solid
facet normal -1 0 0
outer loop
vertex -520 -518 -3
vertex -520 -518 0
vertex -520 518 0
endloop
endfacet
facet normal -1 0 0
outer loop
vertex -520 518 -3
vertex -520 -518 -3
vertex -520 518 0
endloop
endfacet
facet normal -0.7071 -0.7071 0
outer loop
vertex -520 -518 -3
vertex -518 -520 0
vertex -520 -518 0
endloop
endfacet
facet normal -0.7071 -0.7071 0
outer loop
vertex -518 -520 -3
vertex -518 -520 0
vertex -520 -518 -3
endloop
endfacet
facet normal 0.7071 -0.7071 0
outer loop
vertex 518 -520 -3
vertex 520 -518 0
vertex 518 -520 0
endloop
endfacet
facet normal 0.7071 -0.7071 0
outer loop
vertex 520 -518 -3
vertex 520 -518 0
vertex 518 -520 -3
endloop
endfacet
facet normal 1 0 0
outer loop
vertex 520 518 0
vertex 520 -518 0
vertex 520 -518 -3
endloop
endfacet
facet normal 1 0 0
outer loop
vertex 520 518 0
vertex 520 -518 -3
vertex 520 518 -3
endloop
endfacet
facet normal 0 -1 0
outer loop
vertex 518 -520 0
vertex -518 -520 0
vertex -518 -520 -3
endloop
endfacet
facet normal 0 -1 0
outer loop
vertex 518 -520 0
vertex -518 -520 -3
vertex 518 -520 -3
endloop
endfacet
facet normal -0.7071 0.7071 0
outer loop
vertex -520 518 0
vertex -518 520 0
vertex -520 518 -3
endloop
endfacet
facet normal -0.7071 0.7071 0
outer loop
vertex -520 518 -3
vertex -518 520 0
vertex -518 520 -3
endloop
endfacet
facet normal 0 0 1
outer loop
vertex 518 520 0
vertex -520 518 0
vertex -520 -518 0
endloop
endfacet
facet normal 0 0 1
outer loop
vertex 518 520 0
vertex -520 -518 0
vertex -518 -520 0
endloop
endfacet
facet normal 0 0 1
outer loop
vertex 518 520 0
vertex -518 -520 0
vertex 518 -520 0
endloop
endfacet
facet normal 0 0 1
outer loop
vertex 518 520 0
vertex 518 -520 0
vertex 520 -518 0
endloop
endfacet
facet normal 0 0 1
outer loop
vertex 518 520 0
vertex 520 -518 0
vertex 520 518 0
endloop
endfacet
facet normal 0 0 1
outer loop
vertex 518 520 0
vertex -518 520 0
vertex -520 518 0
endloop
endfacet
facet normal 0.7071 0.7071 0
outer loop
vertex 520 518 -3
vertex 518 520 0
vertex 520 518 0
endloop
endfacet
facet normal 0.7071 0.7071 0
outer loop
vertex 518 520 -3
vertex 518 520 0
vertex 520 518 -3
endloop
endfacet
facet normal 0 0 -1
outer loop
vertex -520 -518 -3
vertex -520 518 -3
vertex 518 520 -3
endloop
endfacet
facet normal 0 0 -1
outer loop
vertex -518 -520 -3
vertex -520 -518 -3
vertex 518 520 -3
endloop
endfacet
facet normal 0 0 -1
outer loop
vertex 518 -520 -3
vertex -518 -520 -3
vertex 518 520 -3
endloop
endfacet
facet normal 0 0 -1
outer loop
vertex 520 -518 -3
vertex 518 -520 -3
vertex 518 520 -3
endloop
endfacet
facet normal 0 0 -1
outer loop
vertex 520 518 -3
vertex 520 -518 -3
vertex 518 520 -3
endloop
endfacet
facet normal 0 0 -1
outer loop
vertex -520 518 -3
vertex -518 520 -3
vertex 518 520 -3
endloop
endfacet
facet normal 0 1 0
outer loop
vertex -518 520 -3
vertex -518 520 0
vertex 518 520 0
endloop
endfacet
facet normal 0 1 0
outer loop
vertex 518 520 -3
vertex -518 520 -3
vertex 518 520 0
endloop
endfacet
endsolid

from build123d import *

# Parameters (mm, degrees)
SKETCH_1_W             = 1040
SKETCH_1_H             = 1040
SM_BASE_FLANGE_1_DEPTH = 3
CHAMFER_1_SIZE         = 2


# Sheet-metal steps are written as plain solids
with BuildPart() as part:
    # Sketch 1 → 基体-法兰1 (new body)
    with BuildSketch(Plane.XY):
        Rectangle(SKETCH_1_W, SKETCH_1_H)
    extrude(amount=-SM_BASE_FLANGE_1_DEPTH)

    # 倒角1
    chamfer_1_edges = [part.edges().sort_by_distance(p)[0] for p in [
        (520, -520, -1.5),
        (-520, -520, -1.5),
        (-520, 520, -1.5),
        (520, 520, -1.5),
    ]]
    chamfer(chamfer_1_edges, length=CHAMFER_1_SIZE)


solid = part.part
